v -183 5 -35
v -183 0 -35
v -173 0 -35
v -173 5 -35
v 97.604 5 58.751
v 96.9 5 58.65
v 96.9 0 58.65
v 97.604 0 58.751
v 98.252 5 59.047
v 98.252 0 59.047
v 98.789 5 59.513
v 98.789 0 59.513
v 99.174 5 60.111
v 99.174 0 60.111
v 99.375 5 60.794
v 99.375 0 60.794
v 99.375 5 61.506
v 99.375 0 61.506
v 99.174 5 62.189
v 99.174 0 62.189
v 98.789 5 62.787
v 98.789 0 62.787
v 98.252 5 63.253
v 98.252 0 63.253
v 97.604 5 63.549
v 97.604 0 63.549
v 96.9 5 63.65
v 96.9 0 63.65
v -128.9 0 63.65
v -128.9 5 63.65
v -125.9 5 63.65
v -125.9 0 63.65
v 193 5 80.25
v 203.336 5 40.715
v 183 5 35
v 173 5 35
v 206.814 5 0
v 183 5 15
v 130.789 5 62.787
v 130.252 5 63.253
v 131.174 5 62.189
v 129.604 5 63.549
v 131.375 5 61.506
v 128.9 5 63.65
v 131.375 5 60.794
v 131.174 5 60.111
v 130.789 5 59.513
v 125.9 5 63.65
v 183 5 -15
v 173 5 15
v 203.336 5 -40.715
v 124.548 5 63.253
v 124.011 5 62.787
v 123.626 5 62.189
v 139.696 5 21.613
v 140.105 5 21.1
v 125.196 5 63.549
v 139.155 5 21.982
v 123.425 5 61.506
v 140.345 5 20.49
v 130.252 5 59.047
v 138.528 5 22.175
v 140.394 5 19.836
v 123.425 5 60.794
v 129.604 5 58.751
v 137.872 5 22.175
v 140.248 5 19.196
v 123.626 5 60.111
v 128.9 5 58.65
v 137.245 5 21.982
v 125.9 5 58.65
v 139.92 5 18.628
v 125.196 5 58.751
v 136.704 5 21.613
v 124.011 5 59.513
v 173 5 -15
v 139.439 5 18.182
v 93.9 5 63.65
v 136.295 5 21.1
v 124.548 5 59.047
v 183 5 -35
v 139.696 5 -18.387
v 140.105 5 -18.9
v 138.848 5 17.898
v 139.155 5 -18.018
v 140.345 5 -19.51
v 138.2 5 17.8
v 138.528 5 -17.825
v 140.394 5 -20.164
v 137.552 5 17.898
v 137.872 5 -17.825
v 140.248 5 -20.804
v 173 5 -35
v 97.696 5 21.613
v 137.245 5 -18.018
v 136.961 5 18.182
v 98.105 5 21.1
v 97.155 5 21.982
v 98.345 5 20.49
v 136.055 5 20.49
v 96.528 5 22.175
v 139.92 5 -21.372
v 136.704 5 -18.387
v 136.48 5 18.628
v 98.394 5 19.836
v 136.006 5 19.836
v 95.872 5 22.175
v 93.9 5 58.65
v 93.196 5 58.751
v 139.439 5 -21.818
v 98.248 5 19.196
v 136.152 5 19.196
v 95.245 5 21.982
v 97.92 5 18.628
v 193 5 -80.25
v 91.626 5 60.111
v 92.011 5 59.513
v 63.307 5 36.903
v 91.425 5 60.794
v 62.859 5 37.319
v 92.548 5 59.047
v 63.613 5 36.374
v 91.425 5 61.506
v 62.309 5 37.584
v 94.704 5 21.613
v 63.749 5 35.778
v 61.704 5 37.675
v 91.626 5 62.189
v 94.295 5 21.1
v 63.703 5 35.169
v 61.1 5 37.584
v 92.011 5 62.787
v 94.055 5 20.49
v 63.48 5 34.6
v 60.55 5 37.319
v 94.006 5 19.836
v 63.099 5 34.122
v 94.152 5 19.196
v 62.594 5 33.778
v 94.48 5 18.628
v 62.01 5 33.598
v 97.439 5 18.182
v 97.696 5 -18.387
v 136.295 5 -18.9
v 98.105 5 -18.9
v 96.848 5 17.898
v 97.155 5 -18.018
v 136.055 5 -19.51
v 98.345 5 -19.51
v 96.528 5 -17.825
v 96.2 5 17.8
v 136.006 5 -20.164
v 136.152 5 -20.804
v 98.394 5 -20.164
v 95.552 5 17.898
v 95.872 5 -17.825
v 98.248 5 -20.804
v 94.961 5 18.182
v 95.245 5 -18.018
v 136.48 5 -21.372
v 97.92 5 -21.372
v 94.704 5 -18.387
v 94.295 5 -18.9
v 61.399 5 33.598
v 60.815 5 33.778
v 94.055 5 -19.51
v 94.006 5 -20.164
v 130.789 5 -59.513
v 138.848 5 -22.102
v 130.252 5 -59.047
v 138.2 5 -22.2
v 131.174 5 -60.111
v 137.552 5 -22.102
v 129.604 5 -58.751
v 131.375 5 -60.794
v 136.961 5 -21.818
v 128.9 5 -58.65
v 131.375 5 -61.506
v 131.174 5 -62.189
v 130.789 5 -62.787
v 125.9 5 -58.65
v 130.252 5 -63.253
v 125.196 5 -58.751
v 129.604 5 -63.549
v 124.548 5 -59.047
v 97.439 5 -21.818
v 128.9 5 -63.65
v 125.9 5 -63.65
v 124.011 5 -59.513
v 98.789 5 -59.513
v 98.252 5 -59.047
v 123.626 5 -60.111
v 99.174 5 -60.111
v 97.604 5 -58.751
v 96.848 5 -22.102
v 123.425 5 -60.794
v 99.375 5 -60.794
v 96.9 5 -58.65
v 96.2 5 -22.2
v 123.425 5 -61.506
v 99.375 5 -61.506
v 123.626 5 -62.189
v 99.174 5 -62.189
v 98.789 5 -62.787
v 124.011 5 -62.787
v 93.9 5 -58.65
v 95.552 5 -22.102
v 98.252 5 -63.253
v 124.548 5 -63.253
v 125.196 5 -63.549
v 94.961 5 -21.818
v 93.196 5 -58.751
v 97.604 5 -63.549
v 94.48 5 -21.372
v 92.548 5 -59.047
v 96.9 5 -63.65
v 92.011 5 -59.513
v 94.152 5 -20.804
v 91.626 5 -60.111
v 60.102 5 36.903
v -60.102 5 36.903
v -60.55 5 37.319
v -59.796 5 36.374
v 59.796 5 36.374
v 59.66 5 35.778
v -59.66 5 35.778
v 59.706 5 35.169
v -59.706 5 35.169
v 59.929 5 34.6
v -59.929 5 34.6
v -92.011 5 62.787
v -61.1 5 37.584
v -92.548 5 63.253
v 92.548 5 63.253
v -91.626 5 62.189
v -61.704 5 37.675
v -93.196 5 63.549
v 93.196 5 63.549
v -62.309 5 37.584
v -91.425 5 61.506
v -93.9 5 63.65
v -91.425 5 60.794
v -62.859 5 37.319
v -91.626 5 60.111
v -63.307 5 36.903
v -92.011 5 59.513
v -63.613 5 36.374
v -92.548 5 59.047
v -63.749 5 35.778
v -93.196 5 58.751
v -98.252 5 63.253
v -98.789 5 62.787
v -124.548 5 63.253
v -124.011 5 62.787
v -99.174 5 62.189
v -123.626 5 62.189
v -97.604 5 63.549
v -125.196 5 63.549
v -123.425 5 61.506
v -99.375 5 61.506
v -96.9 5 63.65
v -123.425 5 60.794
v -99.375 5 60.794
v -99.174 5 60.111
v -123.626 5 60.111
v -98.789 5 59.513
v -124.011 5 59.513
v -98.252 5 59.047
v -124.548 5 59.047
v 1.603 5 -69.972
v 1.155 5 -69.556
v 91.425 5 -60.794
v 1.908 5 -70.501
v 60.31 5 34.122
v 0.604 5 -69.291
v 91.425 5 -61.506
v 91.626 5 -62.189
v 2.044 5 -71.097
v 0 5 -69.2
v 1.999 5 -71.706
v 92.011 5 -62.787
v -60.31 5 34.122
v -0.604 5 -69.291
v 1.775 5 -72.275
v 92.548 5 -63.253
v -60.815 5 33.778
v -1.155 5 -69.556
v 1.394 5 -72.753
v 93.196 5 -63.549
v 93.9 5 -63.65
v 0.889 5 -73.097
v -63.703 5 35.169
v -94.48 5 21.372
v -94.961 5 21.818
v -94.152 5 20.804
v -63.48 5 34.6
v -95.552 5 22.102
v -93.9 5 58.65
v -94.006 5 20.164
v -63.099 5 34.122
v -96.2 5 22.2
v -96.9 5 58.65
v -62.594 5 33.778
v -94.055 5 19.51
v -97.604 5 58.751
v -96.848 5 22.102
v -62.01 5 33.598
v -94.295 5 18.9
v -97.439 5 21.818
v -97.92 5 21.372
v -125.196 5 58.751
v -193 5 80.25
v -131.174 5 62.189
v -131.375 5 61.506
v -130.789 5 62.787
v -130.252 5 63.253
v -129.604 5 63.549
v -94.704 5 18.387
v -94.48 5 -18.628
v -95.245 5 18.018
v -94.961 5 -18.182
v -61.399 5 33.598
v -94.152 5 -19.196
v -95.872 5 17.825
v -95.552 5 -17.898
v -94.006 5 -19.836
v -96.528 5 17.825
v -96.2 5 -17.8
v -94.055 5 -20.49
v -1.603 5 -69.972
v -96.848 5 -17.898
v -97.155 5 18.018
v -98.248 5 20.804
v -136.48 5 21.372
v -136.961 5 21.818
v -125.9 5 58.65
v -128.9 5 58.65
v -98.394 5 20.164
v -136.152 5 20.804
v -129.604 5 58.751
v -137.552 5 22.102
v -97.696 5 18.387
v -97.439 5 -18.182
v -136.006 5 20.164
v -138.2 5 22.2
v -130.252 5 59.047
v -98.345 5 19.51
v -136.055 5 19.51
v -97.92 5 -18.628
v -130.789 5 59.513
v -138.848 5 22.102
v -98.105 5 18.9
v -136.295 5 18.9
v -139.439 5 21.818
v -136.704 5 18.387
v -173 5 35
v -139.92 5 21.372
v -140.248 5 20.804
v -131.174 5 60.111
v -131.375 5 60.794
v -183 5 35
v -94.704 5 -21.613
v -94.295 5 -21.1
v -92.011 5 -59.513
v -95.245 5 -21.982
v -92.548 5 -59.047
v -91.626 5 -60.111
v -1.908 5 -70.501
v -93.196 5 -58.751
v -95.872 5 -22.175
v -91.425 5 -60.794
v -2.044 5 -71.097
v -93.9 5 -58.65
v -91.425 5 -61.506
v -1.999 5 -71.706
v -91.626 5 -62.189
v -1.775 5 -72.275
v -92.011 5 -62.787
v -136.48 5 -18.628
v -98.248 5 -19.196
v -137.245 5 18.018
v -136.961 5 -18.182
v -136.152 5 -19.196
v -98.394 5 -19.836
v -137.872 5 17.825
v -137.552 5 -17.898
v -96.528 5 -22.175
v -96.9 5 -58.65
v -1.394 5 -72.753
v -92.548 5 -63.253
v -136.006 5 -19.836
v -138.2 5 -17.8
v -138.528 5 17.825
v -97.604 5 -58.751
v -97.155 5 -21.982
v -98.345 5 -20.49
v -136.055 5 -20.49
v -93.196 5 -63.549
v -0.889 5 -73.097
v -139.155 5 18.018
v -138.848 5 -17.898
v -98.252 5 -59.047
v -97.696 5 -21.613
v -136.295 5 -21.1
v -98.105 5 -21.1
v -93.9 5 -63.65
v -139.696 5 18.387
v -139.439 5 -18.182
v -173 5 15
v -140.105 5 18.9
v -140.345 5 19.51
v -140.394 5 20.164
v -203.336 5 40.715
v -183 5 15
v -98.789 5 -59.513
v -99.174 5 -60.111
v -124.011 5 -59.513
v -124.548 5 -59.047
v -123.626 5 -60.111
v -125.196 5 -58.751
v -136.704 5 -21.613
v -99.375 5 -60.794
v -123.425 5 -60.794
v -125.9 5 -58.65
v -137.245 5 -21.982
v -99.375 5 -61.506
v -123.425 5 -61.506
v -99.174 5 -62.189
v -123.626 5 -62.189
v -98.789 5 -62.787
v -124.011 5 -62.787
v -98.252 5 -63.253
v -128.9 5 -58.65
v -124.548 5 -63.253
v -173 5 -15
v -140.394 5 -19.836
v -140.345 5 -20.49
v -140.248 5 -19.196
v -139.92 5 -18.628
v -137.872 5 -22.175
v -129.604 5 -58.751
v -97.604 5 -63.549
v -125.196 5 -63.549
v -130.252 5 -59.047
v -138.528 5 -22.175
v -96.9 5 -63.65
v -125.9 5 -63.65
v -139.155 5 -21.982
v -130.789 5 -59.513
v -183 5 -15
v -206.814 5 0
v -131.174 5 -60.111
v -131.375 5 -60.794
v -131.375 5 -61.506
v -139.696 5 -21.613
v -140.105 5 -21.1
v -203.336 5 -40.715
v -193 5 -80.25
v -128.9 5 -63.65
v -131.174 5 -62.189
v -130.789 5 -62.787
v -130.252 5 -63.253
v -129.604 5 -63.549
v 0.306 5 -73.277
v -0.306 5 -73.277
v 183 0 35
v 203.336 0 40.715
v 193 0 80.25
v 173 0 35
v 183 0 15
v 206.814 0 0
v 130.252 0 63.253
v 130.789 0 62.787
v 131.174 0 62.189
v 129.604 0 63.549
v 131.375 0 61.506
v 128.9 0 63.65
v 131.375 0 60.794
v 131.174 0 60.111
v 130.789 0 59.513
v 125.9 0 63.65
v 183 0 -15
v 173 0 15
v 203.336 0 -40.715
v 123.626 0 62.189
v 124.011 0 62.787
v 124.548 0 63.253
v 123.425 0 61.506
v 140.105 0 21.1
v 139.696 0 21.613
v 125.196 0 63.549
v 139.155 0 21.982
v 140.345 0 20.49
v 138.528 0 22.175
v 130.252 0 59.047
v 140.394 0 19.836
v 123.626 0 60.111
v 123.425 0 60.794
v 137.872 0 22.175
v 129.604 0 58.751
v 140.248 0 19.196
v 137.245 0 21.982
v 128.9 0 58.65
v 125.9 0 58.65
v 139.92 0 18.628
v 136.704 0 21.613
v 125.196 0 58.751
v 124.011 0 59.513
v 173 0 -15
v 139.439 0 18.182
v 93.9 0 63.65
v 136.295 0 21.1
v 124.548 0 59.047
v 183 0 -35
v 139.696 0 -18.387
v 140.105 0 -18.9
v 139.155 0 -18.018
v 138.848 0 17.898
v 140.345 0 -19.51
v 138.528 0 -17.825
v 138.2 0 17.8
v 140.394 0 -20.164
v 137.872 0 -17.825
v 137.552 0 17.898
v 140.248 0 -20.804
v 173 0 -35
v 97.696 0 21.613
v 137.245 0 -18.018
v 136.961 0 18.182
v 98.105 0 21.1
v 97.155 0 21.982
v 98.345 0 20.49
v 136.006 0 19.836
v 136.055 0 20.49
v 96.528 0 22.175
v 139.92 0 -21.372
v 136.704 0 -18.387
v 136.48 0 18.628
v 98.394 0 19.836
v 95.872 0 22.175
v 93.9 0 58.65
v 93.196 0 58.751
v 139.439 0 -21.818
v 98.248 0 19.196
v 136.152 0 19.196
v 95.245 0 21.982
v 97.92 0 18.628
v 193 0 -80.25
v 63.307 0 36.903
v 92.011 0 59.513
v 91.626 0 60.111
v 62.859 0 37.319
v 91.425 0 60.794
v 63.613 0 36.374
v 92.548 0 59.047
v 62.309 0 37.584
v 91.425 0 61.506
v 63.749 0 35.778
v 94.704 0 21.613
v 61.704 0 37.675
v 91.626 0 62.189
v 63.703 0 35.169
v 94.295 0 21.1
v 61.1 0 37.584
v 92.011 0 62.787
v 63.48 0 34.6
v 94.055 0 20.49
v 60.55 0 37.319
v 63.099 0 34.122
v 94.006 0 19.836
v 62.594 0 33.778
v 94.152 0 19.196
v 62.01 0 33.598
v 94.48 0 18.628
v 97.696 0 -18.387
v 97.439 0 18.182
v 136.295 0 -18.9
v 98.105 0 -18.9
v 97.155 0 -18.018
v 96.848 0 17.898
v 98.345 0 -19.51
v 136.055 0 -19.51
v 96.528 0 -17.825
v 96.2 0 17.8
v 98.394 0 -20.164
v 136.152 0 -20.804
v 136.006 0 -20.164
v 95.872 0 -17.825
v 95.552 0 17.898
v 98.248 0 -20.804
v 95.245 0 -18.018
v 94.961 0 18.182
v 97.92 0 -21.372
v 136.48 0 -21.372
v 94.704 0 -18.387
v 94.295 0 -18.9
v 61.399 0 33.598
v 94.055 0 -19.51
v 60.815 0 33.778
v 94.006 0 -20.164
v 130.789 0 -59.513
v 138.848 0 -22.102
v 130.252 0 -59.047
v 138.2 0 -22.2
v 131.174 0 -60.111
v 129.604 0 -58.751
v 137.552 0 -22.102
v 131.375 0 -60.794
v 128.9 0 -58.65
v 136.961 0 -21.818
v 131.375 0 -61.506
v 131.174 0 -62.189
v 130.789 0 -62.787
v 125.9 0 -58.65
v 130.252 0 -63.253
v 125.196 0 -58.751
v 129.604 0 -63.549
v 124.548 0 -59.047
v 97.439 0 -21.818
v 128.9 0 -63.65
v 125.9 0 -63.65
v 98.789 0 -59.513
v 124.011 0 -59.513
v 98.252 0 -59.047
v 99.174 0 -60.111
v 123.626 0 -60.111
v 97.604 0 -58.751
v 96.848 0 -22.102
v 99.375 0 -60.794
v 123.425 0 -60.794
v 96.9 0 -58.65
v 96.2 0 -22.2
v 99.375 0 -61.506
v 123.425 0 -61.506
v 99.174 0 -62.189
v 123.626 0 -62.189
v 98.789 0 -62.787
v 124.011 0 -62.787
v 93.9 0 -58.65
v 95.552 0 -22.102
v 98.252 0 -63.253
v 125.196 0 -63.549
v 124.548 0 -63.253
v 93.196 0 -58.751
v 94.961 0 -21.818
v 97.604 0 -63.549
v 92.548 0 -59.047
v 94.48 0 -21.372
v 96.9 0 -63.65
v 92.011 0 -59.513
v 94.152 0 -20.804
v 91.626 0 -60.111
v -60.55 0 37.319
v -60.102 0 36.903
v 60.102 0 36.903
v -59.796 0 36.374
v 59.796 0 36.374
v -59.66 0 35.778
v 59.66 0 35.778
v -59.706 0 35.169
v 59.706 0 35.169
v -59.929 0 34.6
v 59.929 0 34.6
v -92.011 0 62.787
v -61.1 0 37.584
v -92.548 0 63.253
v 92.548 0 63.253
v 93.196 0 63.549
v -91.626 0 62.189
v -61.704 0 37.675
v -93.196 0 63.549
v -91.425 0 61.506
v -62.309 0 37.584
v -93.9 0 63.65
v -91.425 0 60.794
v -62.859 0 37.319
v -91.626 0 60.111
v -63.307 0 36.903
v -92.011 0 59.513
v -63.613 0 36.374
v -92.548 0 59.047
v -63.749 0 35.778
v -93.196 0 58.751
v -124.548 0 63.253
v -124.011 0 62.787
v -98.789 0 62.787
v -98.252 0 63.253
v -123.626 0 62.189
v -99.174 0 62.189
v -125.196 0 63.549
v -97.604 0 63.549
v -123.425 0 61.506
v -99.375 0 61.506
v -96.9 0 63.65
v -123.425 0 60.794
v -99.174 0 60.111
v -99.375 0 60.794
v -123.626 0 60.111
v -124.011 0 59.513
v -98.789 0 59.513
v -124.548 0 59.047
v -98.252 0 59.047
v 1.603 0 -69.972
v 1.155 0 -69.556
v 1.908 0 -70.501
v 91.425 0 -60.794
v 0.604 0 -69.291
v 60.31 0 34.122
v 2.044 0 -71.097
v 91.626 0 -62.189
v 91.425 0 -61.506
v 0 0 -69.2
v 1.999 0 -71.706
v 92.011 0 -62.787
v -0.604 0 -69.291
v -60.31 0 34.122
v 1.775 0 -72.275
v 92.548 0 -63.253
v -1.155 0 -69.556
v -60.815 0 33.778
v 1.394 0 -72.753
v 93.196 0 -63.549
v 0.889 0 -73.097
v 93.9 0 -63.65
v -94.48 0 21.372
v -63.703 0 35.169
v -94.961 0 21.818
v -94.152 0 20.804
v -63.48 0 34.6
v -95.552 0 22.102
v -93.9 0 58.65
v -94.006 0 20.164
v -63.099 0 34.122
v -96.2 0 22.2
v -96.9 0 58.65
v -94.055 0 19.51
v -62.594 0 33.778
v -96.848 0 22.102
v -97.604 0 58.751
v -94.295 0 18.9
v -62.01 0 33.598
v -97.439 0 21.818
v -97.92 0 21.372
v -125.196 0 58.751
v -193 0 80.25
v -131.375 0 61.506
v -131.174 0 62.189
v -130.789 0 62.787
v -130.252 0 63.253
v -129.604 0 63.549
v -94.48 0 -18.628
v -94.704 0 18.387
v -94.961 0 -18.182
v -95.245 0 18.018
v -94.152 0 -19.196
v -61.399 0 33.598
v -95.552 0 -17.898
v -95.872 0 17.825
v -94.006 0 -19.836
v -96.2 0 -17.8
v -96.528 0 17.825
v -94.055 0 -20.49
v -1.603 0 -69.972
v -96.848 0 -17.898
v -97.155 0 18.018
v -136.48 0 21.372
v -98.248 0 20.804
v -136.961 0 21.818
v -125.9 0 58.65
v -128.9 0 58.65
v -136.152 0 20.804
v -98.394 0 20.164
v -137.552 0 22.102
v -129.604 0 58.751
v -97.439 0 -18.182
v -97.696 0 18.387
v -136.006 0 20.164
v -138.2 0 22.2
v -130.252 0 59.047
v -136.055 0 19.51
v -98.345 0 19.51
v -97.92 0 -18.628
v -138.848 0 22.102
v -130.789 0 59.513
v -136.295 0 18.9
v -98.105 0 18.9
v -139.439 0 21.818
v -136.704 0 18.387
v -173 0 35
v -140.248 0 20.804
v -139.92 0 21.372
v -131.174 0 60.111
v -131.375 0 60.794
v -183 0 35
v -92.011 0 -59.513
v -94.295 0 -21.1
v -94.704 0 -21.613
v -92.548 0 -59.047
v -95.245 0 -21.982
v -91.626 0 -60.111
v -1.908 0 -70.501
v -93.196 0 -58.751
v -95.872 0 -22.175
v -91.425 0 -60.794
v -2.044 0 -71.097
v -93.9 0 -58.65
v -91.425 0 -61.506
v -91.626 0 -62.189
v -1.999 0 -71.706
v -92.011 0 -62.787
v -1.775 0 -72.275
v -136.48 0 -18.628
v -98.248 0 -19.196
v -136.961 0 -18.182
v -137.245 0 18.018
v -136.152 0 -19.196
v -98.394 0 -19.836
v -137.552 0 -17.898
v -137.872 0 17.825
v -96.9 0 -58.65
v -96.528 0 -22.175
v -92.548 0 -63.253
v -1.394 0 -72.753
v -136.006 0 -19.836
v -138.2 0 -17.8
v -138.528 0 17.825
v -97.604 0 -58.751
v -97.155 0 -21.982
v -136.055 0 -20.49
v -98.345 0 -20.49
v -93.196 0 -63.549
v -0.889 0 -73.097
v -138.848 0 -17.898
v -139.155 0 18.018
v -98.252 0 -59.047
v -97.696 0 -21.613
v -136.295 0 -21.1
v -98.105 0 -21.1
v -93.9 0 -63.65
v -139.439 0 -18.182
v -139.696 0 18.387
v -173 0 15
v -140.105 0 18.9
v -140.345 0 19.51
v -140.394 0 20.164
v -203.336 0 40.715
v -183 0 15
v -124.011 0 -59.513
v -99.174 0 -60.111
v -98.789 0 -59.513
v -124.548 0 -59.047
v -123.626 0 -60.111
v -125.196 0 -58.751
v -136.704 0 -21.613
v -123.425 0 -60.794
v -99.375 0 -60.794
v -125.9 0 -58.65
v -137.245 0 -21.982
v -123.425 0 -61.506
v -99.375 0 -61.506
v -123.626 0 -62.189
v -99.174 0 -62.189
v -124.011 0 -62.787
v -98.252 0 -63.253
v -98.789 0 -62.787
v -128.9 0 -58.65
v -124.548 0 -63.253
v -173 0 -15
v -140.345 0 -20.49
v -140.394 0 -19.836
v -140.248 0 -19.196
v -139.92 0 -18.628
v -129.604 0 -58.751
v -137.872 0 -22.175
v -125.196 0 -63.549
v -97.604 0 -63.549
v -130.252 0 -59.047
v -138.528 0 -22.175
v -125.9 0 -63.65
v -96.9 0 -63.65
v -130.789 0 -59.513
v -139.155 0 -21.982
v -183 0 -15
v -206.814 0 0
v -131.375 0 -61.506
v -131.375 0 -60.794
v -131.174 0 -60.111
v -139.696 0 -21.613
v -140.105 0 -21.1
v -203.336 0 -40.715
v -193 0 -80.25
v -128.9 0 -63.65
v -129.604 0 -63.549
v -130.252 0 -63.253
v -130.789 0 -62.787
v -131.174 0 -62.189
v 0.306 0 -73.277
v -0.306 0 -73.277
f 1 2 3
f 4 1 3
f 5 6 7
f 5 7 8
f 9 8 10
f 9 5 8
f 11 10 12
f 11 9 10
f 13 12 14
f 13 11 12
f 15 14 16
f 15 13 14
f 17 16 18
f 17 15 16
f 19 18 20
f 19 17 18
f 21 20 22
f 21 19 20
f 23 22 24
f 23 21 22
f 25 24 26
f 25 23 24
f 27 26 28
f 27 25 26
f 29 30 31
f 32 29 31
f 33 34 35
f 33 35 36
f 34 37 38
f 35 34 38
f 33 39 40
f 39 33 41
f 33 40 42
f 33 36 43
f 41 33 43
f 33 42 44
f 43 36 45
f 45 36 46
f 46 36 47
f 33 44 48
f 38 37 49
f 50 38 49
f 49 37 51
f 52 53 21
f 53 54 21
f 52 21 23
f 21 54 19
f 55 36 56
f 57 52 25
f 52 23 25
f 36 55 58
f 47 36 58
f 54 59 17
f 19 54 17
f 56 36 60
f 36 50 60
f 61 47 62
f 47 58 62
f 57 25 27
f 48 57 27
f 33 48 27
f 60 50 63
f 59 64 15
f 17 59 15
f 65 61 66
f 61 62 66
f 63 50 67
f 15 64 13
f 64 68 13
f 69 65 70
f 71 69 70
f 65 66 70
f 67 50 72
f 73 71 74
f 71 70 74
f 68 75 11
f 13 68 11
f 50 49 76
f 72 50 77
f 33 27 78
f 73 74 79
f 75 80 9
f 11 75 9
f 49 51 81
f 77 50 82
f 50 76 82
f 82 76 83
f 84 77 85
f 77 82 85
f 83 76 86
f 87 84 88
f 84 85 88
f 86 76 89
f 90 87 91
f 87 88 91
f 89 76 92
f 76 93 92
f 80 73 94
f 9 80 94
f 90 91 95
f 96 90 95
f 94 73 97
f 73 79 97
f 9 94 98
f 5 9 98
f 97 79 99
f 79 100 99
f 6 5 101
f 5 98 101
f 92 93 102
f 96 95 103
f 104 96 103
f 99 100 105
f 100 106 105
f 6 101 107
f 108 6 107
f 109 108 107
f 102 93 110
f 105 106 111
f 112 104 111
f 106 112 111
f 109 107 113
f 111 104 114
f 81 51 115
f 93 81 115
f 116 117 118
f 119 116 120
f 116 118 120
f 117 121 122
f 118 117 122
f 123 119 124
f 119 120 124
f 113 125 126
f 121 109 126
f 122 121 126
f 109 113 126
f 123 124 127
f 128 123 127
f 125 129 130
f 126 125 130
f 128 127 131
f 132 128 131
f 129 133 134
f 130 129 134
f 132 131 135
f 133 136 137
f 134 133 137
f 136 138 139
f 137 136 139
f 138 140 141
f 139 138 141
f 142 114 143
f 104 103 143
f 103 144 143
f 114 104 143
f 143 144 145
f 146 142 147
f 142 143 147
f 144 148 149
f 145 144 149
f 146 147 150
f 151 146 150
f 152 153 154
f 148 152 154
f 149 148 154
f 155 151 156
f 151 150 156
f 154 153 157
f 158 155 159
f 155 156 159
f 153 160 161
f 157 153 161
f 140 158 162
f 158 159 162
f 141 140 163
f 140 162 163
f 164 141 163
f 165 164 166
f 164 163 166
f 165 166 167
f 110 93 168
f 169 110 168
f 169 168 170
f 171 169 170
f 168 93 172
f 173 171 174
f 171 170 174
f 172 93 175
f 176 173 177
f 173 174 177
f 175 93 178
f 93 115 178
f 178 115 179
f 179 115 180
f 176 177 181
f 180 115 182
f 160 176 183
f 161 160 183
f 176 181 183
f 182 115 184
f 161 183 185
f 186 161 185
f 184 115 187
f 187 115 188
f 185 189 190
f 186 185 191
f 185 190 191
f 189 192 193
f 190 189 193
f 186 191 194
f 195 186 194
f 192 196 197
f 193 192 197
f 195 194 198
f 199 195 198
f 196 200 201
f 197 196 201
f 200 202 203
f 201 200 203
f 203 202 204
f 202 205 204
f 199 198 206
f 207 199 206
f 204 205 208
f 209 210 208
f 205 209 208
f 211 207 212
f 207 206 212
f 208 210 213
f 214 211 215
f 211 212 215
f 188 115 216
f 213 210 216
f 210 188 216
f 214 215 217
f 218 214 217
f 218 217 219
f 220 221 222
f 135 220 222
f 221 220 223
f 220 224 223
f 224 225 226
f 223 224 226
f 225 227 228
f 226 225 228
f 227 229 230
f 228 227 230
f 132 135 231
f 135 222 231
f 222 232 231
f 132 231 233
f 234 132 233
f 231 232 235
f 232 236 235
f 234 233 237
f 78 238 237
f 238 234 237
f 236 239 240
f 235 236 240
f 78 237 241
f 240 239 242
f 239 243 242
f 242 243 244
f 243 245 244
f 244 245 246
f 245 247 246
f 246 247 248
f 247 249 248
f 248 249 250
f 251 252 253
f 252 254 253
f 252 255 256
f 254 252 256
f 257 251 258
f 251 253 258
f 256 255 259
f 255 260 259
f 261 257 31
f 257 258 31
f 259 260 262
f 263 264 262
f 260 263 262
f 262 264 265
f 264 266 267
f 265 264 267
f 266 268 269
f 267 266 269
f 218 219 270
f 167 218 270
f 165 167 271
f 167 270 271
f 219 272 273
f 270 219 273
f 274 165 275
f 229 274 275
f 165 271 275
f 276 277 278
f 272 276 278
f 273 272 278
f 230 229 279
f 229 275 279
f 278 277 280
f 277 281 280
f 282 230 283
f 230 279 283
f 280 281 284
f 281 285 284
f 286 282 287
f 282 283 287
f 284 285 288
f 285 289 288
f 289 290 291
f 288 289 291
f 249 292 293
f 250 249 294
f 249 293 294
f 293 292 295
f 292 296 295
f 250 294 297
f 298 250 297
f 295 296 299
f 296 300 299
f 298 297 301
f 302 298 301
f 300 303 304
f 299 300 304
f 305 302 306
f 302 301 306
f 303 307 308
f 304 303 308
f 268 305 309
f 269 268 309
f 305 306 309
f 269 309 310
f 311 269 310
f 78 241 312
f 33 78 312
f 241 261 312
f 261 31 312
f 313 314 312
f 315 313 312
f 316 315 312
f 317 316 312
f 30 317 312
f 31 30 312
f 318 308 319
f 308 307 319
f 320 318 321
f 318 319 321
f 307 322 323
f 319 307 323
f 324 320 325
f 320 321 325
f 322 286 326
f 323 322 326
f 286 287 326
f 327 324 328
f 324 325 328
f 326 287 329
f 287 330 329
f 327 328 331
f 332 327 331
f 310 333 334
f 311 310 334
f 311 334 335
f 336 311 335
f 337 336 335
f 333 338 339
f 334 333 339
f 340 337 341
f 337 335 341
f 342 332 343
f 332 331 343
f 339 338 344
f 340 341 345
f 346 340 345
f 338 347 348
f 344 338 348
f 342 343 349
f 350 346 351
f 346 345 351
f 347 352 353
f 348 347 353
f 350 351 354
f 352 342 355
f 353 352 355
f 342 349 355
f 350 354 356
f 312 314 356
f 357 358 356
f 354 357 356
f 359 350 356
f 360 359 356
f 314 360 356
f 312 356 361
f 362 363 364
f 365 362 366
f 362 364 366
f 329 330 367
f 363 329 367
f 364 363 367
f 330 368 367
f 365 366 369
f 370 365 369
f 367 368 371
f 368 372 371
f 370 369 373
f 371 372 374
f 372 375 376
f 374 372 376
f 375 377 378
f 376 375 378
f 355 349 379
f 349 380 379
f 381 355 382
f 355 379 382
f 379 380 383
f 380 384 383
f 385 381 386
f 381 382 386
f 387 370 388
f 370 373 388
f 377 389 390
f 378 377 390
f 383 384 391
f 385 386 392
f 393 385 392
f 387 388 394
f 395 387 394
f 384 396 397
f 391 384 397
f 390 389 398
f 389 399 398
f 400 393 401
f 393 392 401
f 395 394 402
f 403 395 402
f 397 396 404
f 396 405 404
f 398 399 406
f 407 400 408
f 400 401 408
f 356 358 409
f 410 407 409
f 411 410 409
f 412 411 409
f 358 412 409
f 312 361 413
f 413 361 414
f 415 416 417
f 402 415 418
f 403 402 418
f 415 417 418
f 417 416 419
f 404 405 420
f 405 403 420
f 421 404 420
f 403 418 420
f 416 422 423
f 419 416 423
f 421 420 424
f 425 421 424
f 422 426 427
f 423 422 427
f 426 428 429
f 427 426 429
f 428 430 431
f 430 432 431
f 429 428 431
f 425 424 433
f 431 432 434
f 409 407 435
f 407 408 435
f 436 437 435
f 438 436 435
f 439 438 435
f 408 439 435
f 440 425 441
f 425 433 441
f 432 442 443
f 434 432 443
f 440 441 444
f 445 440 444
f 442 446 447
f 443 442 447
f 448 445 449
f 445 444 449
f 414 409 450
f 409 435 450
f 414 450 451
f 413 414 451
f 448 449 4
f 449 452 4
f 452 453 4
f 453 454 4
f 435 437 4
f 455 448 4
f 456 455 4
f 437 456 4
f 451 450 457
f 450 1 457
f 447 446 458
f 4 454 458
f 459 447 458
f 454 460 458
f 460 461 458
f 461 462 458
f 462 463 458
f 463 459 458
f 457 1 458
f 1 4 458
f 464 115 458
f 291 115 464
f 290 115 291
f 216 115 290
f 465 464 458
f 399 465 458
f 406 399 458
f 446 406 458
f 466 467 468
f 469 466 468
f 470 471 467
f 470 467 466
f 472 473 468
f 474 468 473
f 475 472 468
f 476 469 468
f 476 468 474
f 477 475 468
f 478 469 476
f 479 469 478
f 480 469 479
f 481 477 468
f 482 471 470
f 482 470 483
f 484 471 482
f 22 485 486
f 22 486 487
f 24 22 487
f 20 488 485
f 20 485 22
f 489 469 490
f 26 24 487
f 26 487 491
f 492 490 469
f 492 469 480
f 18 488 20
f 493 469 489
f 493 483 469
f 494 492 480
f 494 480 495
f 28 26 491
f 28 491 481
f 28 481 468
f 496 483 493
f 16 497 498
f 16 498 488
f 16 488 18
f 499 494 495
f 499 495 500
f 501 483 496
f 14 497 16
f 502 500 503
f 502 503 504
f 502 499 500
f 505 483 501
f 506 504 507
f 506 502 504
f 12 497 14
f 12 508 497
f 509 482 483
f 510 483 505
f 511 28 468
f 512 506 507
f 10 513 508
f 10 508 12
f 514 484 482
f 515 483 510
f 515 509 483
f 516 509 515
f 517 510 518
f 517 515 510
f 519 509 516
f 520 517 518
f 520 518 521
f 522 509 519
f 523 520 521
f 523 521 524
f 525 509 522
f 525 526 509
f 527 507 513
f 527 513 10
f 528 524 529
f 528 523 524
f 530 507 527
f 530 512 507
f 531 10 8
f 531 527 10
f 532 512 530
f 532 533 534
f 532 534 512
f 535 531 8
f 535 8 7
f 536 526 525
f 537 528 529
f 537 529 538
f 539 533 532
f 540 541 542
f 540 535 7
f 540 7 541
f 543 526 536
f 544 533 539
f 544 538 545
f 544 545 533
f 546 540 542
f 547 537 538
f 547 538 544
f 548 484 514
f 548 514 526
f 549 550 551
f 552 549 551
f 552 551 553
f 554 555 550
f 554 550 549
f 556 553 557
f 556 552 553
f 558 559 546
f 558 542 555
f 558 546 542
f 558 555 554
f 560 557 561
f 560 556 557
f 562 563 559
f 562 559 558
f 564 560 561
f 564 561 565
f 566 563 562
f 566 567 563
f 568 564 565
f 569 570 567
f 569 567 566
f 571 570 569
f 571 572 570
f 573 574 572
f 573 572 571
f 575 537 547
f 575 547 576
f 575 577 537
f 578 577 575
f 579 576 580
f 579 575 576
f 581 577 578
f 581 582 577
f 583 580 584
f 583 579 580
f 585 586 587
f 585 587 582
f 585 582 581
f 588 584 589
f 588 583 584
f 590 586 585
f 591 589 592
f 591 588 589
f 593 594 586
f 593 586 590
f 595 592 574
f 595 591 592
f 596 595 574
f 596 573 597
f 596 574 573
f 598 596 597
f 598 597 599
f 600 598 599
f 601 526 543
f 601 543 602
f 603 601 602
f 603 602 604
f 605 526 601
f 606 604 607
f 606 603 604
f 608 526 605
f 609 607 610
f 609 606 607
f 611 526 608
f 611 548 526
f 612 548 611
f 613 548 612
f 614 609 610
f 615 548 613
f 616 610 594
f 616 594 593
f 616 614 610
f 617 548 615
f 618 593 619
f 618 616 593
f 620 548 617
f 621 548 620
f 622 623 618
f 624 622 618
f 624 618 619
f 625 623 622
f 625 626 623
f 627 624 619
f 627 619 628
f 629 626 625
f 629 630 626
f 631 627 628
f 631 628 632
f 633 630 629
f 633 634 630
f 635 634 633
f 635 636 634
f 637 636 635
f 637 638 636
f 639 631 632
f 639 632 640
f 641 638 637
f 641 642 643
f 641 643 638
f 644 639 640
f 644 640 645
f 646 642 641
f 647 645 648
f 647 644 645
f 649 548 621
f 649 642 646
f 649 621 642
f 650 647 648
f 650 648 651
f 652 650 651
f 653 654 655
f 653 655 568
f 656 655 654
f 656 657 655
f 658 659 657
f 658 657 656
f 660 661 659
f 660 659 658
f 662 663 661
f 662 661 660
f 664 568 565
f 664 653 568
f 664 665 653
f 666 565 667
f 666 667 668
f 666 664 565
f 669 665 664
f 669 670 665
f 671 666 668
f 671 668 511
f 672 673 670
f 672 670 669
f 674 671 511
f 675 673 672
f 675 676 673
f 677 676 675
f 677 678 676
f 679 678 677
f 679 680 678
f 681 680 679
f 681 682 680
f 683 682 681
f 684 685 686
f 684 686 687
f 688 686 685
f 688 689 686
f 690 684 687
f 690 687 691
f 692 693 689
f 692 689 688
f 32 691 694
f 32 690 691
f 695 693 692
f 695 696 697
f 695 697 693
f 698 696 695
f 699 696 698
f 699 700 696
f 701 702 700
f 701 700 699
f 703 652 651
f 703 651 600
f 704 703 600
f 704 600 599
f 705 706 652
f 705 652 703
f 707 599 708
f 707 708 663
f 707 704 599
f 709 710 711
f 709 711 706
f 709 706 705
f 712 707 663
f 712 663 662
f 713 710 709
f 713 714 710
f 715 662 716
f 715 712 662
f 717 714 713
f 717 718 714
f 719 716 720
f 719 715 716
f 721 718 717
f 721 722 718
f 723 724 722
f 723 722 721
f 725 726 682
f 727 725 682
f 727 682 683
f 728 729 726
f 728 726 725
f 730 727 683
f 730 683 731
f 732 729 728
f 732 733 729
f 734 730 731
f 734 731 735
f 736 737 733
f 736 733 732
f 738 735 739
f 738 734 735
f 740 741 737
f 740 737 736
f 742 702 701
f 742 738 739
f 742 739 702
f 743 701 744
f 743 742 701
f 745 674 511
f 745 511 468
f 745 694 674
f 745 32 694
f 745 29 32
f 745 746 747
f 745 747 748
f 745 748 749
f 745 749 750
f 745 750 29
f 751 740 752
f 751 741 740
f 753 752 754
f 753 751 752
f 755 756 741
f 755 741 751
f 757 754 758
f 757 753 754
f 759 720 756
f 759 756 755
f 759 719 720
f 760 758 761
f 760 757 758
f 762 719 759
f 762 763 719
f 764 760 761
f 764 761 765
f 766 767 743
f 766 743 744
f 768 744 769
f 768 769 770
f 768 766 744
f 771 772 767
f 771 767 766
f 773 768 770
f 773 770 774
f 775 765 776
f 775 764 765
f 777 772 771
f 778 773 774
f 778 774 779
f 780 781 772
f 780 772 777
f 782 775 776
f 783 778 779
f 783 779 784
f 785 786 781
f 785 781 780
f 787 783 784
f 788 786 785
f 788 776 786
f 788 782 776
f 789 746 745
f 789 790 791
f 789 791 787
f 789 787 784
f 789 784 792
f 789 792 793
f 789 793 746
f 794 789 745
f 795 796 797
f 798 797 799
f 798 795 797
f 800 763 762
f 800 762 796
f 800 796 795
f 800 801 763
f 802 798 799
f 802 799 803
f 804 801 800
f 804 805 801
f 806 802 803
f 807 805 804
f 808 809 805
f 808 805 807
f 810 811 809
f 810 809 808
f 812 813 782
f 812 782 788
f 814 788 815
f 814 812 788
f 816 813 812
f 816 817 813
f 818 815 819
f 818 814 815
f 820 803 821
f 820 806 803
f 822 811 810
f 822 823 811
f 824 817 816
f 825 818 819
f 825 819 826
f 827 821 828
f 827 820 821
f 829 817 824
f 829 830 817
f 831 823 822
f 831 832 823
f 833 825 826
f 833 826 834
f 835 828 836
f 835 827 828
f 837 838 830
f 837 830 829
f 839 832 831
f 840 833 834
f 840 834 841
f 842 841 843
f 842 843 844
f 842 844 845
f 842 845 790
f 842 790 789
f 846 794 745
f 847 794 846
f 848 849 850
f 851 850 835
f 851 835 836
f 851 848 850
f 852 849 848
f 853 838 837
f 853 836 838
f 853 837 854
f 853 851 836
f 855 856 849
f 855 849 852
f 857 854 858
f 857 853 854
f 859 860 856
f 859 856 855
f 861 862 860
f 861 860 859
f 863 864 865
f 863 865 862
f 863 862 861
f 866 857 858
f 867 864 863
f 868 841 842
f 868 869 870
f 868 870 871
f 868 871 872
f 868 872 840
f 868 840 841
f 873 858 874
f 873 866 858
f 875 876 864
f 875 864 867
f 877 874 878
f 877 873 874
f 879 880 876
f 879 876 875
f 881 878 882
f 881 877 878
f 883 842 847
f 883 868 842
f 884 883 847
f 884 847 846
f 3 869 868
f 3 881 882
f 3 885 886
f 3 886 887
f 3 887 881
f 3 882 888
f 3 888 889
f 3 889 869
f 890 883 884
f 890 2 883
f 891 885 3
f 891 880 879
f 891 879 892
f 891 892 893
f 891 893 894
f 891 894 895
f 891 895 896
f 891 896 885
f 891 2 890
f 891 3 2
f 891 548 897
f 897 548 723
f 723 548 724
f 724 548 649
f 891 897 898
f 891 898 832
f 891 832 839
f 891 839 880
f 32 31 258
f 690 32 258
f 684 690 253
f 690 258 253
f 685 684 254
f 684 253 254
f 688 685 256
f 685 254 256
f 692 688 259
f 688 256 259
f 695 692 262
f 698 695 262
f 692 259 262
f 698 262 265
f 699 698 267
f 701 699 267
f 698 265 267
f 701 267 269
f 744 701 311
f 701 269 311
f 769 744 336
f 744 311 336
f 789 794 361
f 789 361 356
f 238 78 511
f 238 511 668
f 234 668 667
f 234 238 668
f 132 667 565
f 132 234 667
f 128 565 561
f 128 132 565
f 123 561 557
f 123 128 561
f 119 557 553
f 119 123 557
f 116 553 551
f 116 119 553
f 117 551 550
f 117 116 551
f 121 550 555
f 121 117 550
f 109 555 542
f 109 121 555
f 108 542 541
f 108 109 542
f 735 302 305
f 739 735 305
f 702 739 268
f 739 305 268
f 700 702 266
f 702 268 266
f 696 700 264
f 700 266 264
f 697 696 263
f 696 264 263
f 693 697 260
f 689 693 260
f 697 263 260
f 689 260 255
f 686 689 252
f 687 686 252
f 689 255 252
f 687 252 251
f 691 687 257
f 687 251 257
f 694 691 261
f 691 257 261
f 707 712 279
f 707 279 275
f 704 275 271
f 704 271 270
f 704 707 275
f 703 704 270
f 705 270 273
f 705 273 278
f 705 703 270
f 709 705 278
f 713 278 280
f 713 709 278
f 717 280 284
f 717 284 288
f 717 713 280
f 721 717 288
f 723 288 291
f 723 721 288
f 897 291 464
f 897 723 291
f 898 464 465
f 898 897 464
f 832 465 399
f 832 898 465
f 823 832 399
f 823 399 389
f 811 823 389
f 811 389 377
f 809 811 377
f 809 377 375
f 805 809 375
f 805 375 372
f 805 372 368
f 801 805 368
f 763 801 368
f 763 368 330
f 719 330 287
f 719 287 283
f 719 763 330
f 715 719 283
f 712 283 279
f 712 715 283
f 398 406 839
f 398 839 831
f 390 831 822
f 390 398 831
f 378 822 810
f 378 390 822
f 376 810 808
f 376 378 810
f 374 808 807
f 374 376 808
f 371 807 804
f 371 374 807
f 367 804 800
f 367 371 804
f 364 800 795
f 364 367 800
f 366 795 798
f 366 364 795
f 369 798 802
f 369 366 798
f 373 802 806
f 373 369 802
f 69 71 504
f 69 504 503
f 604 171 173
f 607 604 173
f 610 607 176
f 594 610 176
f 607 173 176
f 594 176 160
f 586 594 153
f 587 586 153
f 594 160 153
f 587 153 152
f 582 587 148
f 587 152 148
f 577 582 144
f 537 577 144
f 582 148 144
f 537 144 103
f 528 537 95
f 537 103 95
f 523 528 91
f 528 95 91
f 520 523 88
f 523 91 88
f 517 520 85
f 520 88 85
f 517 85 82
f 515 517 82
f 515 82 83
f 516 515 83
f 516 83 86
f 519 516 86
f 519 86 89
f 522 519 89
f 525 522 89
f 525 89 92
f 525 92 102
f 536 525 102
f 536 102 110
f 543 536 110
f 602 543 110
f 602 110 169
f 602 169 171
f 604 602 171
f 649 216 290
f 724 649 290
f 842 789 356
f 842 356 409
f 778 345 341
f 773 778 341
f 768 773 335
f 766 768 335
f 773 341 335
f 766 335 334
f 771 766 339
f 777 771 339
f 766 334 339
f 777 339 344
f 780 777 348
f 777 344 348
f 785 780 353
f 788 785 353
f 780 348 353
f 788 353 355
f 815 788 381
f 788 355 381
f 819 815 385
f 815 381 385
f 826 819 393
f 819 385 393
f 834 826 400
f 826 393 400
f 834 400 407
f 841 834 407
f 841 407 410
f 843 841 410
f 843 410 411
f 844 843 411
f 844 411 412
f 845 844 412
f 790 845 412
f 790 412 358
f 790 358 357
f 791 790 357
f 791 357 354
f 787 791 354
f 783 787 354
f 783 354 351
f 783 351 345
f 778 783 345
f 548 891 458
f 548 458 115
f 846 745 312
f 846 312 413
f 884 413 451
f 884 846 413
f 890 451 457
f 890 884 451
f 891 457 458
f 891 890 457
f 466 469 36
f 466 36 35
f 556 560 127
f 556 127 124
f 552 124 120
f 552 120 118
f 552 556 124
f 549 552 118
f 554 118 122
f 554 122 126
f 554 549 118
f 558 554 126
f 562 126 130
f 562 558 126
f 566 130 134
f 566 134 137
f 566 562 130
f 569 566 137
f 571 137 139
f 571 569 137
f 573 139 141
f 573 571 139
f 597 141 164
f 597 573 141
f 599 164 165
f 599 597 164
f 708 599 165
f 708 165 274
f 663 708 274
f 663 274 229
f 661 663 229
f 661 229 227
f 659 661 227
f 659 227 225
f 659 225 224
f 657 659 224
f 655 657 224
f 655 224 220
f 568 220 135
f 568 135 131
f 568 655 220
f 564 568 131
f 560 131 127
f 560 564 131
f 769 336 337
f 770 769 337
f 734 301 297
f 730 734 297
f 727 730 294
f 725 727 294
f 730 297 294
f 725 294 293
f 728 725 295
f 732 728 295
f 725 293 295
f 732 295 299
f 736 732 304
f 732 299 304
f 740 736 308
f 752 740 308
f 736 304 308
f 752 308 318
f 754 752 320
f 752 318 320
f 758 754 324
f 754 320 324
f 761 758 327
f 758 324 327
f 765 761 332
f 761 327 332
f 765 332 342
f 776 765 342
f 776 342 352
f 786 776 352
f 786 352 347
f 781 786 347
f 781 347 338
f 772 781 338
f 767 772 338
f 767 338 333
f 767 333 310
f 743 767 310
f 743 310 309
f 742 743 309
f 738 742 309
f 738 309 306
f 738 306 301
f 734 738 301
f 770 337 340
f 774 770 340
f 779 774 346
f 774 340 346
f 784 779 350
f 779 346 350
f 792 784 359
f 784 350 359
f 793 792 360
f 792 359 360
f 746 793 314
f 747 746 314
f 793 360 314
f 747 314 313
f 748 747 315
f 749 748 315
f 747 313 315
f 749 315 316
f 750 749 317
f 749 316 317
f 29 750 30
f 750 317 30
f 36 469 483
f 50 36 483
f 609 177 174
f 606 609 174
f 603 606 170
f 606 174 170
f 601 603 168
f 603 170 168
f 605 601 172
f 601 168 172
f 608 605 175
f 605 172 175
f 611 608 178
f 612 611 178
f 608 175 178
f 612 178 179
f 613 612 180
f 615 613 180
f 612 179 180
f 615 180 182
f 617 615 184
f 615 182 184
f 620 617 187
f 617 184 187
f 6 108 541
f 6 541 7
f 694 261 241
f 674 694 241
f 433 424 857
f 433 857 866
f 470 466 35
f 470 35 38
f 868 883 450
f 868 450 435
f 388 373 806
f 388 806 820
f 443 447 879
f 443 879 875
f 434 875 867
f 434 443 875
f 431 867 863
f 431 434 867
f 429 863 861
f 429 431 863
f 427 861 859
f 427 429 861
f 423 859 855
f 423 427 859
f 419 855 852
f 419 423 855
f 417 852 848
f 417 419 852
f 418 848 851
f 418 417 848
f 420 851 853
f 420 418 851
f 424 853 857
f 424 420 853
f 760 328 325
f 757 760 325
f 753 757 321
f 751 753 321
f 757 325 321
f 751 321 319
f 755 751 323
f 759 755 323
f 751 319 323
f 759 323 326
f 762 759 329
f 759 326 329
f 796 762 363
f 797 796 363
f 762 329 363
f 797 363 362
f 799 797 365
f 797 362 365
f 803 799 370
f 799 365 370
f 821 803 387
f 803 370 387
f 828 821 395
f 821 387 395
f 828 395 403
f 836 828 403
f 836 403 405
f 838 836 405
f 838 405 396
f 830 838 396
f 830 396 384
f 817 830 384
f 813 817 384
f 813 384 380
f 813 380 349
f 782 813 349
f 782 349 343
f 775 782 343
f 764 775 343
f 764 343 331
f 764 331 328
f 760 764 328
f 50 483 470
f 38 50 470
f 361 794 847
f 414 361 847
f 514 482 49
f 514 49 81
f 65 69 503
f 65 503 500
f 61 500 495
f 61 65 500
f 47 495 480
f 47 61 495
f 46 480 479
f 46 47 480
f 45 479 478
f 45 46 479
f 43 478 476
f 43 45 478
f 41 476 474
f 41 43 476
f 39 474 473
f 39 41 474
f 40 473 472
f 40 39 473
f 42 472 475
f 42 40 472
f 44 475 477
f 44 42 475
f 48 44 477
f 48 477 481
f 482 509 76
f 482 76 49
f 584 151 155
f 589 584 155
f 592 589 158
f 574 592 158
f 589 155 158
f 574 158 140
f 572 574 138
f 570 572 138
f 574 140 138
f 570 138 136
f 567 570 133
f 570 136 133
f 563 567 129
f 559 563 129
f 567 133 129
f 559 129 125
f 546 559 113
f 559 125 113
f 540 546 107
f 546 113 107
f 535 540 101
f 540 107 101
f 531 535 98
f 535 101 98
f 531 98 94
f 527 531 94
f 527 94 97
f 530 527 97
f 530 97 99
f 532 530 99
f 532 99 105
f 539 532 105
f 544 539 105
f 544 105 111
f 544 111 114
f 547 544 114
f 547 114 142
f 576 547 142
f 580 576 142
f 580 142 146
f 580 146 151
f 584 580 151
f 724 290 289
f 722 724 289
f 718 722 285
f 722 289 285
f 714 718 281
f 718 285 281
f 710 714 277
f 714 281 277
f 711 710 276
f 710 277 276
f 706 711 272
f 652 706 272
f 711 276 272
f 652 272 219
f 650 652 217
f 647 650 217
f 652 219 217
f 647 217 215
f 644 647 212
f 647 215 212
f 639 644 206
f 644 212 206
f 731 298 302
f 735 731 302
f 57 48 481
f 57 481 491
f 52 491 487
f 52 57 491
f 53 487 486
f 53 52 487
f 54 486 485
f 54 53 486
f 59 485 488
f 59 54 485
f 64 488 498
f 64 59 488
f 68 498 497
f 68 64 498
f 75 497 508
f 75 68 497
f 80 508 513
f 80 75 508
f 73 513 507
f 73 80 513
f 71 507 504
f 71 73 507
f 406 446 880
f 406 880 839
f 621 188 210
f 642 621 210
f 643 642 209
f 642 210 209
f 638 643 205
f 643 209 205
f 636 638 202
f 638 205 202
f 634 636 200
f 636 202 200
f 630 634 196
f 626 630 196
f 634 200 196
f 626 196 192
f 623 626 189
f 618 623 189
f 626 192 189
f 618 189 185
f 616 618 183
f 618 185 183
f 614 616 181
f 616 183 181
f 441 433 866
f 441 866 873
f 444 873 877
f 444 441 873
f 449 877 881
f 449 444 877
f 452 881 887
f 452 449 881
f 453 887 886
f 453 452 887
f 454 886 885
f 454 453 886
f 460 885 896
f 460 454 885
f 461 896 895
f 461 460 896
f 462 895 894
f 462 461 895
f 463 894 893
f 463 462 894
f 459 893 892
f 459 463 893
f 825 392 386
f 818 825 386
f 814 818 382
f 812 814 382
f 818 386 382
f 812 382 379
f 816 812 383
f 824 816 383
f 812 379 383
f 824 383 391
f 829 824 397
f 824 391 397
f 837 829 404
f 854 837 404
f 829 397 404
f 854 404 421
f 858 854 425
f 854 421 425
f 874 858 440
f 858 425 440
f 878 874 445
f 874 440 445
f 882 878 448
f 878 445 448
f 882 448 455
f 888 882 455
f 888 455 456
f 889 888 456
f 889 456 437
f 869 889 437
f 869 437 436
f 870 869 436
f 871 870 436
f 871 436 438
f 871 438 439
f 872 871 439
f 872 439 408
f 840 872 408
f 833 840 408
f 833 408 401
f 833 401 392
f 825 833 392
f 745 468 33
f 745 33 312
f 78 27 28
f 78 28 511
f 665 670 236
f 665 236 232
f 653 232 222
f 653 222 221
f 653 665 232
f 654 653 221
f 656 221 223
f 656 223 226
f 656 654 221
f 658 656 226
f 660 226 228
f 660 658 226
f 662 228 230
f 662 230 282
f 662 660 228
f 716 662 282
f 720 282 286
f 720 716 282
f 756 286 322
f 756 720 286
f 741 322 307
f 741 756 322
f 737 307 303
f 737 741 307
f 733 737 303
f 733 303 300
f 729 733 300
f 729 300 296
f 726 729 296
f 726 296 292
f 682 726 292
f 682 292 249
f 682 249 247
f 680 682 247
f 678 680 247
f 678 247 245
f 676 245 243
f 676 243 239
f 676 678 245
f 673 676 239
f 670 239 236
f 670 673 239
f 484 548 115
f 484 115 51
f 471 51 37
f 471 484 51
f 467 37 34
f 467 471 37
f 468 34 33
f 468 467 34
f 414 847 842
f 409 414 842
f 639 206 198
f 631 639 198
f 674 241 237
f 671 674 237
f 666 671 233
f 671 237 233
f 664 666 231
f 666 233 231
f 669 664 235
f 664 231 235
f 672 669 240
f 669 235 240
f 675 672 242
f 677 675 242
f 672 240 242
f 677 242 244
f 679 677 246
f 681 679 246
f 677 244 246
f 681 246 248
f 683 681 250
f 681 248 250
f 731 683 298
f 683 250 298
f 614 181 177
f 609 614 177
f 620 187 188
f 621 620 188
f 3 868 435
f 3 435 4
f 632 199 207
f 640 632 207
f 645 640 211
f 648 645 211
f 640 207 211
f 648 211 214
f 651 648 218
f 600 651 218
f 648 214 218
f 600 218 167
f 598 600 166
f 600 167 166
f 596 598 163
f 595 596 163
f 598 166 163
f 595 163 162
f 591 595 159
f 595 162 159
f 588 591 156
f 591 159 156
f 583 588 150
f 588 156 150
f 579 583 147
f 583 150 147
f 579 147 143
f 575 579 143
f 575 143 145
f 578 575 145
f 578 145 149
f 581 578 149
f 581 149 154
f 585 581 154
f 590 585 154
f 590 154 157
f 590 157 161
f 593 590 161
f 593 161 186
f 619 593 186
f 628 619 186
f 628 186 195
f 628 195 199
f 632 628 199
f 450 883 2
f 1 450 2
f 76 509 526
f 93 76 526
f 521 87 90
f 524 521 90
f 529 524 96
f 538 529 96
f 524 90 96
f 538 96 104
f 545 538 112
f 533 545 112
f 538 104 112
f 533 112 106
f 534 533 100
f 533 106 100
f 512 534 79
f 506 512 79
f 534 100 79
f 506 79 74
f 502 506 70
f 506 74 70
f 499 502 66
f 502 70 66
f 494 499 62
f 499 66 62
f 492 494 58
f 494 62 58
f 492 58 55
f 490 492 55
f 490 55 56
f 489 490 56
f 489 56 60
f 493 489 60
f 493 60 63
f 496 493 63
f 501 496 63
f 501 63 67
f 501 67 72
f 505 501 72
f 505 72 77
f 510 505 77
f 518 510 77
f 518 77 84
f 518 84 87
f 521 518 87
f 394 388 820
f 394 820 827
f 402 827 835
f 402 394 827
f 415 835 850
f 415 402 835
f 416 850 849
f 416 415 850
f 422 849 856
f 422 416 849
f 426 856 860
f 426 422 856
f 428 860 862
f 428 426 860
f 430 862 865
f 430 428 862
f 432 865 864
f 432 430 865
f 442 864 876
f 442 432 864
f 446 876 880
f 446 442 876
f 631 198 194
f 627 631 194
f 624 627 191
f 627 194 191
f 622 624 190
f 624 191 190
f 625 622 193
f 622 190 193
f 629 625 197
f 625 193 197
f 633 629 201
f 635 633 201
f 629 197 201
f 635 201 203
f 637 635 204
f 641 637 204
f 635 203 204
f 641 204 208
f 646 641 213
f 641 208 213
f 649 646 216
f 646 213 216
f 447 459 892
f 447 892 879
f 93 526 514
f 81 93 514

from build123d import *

# Parameters (mm, degrees)
SKETCH_1_R          = 2.05
SKETCH_1_W          = 10
SKETCH_1_H          = 20
EXTRUDE_1_DEPTH     = 5
SKETCH_4_R          = 2.2
CUT_EXTRUDE_1_DEPTH = 222.894677065


with BuildPart() as part:
    # 草圖1 → 填料-伸長1 (new body)
    with BuildSketch(Plane(origin=(0, 0, 0), x_dir=(1, 0, 0), z_dir=(0, 1, 0))):
        with BuildLine():
            Line((193, -80.25), (-193, -80.25))
            ThreePointArc((-193, -80.25), (-206.814373799, 0), (-193, 80.25))
            Line((-193, 80.25), (193, 80.25))
            ThreePointArc((193, 80.25), (206.814373799, 0), (193, -80.25))
        make_face()
        with Locations(Location((0, 71.25, 0), (0, 0, 270))):
            Circle(SKETCH_1_R, mode=Mode.SUBTRACT)
        with Locations(Location((61.70431002, -35.625, 0), (0, 0, 270))):
            Circle(SKETCH_1_R, mode=Mode.SUBTRACT)
        with Locations(Location((-61.70431002, -35.625, 0), (0, 0, 270))):
            Circle(SKETCH_1_R, mode=Mode.SUBTRACT)
        with Locations((178, -25)):
            Rectangle(SKETCH_1_W, SKETCH_1_H, mode=Mode.SUBTRACT)
        with Locations((-178, -25)):
            Rectangle(SKETCH_1_W, SKETCH_1_H, mode=Mode.SUBTRACT)
        with Locations((-178, 25)):
            Rectangle(SKETCH_1_W, SKETCH_1_H, mode=Mode.SUBTRACT)
        with Locations((178, 25)):
            Rectangle(SKETCH_1_W, SKETCH_1_H, mode=Mode.SUBTRACT)
    extrude(amount=EXTRUDE_1_DEPTH)

    # 草圖4 → 除料-伸長1 (cut, through all)
    with BuildSketch(Plane(origin=(0, 5, 0), x_dir=(1, 0, 0), z_dir=(0, 1, 0))):
        with Locations(Location((-138.2, 20, 0), (0, 0, 270))):
            Circle(SKETCH_4_R)
        with Locations(Location((-96.2, 20, 0), (0, 0, 270))):
            Circle(SKETCH_4_R)
        with Locations(Location((-96.2, -20, 0), (0, 0, 270))):
            Circle(SKETCH_4_R)
        with Locations(Location((-138.2, -20, 0), (0, 0, 270))):
            Circle(SKETCH_4_R)
        with Locations(Location((96.2, -20, 0), (0, 0, 90))):
            Circle(SKETCH_4_R)
        with Locations(Location((138.2, -20, 0), (0, 0, 90))):
            Circle(SKETCH_4_R)
        with Locations(Location((96.2, 20, 0), (0, 0, 90))):
            Circle(SKETCH_4_R)
        with Locations(Location((138.2, 20, 0), (0, 0, 90))):
            Circle(SKETCH_4_R)
        with BuildLine():
            Line((-96.9, 63.65), (-93.9, 63.65))
            ThreePointArc((-93.9, 63.65), (-91.4, 61.15), (-93.9, 58.65))
            Line((-93.9, 58.65), (-96.9, 58.65))
            ThreePointArc((-96.9, 58.65), (-99.4, 61.15), (-96.9, 63.65))
        make_face()
        with BuildLine():
            Line((-128.9, 63.65), (-125.9, 63.65))
            ThreePointArc((-125.9, 63.65), (-123.4, 61.15), (-125.9, 58.65))
            Line((-125.9, 58.65), (-128.9, 58.65))
            ThreePointArc((-128.9, 58.65), (-131.4, 61.15), (-128.9, 63.65))
        make_face()
        with BuildLine():
            Line((-96.9, -63.65), (-93.9, -63.65))
            ThreePointArc((-93.9, -63.65), (-91.4, -61.15), (-93.9, -58.65))
            Line((-93.9, -58.65), (-96.9, -58.65))
            ThreePointArc((-96.9, -58.65), (-99.4, -61.15), (-96.9, -63.65))
        make_face()
        with BuildLine():
            Line((-128.9, -63.65), (-125.9, -63.65))
            ThreePointArc((-125.9, -63.65), (-123.4, -61.15), (-125.9, -58.65))
            Line((-125.9, -58.65), (-128.9, -58.65))
            ThreePointArc((-128.9, -58.65), (-131.4, -61.15), (-128.9, -63.65))
        make_face()
        with BuildLine():
            Line((96.9, -63.65), (93.9, -63.65))
            ThreePointArc((93.9, -63.65), (91.4, -61.15), (93.9, -58.65))
            Line((93.9, -58.65), (96.9, -58.65))
            ThreePointArc((96.9, -58.65), (99.4, -61.15), (96.9, -63.65))
        make_face()
        with BuildLine():
            Line((128.9, -63.65), (125.9, -63.65))
            ThreePointArc((125.9, -63.65), (123.4, -61.15), (125.9, -58.65))
            Line((125.9, -58.65), (128.9, -58.65))
            ThreePointArc((128.9, -58.65), (131.4, -61.15), (128.9, -63.65))
        make_face()
        with BuildLine():
            Line((96.9, 63.65), (93.9, 63.65))
            ThreePointArc((93.9, 63.65), (91.4, 61.15), (93.9, 58.65))
            Line((93.9, 58.65), (96.9, 58.65))
            ThreePointArc((96.9, 58.65), (99.4, 61.15), (96.9, 63.65))
        make_face()
        with BuildLine():
            Line((128.9, 63.65), (125.9, 63.65))
            ThreePointArc((125.9, 63.65), (123.4, 61.15), (125.9, 58.65))
            Line((125.9, 58.65), (128.9, 58.65))
            ThreePointArc((128.9, 58.65), (131.4, 61.15), (128.9, 63.65))
        make_face()
    extrude(amount=-CUT_EXTRUDE_1_DEPTH, mode=Mode.SUBTRACT)


solid = part.part
